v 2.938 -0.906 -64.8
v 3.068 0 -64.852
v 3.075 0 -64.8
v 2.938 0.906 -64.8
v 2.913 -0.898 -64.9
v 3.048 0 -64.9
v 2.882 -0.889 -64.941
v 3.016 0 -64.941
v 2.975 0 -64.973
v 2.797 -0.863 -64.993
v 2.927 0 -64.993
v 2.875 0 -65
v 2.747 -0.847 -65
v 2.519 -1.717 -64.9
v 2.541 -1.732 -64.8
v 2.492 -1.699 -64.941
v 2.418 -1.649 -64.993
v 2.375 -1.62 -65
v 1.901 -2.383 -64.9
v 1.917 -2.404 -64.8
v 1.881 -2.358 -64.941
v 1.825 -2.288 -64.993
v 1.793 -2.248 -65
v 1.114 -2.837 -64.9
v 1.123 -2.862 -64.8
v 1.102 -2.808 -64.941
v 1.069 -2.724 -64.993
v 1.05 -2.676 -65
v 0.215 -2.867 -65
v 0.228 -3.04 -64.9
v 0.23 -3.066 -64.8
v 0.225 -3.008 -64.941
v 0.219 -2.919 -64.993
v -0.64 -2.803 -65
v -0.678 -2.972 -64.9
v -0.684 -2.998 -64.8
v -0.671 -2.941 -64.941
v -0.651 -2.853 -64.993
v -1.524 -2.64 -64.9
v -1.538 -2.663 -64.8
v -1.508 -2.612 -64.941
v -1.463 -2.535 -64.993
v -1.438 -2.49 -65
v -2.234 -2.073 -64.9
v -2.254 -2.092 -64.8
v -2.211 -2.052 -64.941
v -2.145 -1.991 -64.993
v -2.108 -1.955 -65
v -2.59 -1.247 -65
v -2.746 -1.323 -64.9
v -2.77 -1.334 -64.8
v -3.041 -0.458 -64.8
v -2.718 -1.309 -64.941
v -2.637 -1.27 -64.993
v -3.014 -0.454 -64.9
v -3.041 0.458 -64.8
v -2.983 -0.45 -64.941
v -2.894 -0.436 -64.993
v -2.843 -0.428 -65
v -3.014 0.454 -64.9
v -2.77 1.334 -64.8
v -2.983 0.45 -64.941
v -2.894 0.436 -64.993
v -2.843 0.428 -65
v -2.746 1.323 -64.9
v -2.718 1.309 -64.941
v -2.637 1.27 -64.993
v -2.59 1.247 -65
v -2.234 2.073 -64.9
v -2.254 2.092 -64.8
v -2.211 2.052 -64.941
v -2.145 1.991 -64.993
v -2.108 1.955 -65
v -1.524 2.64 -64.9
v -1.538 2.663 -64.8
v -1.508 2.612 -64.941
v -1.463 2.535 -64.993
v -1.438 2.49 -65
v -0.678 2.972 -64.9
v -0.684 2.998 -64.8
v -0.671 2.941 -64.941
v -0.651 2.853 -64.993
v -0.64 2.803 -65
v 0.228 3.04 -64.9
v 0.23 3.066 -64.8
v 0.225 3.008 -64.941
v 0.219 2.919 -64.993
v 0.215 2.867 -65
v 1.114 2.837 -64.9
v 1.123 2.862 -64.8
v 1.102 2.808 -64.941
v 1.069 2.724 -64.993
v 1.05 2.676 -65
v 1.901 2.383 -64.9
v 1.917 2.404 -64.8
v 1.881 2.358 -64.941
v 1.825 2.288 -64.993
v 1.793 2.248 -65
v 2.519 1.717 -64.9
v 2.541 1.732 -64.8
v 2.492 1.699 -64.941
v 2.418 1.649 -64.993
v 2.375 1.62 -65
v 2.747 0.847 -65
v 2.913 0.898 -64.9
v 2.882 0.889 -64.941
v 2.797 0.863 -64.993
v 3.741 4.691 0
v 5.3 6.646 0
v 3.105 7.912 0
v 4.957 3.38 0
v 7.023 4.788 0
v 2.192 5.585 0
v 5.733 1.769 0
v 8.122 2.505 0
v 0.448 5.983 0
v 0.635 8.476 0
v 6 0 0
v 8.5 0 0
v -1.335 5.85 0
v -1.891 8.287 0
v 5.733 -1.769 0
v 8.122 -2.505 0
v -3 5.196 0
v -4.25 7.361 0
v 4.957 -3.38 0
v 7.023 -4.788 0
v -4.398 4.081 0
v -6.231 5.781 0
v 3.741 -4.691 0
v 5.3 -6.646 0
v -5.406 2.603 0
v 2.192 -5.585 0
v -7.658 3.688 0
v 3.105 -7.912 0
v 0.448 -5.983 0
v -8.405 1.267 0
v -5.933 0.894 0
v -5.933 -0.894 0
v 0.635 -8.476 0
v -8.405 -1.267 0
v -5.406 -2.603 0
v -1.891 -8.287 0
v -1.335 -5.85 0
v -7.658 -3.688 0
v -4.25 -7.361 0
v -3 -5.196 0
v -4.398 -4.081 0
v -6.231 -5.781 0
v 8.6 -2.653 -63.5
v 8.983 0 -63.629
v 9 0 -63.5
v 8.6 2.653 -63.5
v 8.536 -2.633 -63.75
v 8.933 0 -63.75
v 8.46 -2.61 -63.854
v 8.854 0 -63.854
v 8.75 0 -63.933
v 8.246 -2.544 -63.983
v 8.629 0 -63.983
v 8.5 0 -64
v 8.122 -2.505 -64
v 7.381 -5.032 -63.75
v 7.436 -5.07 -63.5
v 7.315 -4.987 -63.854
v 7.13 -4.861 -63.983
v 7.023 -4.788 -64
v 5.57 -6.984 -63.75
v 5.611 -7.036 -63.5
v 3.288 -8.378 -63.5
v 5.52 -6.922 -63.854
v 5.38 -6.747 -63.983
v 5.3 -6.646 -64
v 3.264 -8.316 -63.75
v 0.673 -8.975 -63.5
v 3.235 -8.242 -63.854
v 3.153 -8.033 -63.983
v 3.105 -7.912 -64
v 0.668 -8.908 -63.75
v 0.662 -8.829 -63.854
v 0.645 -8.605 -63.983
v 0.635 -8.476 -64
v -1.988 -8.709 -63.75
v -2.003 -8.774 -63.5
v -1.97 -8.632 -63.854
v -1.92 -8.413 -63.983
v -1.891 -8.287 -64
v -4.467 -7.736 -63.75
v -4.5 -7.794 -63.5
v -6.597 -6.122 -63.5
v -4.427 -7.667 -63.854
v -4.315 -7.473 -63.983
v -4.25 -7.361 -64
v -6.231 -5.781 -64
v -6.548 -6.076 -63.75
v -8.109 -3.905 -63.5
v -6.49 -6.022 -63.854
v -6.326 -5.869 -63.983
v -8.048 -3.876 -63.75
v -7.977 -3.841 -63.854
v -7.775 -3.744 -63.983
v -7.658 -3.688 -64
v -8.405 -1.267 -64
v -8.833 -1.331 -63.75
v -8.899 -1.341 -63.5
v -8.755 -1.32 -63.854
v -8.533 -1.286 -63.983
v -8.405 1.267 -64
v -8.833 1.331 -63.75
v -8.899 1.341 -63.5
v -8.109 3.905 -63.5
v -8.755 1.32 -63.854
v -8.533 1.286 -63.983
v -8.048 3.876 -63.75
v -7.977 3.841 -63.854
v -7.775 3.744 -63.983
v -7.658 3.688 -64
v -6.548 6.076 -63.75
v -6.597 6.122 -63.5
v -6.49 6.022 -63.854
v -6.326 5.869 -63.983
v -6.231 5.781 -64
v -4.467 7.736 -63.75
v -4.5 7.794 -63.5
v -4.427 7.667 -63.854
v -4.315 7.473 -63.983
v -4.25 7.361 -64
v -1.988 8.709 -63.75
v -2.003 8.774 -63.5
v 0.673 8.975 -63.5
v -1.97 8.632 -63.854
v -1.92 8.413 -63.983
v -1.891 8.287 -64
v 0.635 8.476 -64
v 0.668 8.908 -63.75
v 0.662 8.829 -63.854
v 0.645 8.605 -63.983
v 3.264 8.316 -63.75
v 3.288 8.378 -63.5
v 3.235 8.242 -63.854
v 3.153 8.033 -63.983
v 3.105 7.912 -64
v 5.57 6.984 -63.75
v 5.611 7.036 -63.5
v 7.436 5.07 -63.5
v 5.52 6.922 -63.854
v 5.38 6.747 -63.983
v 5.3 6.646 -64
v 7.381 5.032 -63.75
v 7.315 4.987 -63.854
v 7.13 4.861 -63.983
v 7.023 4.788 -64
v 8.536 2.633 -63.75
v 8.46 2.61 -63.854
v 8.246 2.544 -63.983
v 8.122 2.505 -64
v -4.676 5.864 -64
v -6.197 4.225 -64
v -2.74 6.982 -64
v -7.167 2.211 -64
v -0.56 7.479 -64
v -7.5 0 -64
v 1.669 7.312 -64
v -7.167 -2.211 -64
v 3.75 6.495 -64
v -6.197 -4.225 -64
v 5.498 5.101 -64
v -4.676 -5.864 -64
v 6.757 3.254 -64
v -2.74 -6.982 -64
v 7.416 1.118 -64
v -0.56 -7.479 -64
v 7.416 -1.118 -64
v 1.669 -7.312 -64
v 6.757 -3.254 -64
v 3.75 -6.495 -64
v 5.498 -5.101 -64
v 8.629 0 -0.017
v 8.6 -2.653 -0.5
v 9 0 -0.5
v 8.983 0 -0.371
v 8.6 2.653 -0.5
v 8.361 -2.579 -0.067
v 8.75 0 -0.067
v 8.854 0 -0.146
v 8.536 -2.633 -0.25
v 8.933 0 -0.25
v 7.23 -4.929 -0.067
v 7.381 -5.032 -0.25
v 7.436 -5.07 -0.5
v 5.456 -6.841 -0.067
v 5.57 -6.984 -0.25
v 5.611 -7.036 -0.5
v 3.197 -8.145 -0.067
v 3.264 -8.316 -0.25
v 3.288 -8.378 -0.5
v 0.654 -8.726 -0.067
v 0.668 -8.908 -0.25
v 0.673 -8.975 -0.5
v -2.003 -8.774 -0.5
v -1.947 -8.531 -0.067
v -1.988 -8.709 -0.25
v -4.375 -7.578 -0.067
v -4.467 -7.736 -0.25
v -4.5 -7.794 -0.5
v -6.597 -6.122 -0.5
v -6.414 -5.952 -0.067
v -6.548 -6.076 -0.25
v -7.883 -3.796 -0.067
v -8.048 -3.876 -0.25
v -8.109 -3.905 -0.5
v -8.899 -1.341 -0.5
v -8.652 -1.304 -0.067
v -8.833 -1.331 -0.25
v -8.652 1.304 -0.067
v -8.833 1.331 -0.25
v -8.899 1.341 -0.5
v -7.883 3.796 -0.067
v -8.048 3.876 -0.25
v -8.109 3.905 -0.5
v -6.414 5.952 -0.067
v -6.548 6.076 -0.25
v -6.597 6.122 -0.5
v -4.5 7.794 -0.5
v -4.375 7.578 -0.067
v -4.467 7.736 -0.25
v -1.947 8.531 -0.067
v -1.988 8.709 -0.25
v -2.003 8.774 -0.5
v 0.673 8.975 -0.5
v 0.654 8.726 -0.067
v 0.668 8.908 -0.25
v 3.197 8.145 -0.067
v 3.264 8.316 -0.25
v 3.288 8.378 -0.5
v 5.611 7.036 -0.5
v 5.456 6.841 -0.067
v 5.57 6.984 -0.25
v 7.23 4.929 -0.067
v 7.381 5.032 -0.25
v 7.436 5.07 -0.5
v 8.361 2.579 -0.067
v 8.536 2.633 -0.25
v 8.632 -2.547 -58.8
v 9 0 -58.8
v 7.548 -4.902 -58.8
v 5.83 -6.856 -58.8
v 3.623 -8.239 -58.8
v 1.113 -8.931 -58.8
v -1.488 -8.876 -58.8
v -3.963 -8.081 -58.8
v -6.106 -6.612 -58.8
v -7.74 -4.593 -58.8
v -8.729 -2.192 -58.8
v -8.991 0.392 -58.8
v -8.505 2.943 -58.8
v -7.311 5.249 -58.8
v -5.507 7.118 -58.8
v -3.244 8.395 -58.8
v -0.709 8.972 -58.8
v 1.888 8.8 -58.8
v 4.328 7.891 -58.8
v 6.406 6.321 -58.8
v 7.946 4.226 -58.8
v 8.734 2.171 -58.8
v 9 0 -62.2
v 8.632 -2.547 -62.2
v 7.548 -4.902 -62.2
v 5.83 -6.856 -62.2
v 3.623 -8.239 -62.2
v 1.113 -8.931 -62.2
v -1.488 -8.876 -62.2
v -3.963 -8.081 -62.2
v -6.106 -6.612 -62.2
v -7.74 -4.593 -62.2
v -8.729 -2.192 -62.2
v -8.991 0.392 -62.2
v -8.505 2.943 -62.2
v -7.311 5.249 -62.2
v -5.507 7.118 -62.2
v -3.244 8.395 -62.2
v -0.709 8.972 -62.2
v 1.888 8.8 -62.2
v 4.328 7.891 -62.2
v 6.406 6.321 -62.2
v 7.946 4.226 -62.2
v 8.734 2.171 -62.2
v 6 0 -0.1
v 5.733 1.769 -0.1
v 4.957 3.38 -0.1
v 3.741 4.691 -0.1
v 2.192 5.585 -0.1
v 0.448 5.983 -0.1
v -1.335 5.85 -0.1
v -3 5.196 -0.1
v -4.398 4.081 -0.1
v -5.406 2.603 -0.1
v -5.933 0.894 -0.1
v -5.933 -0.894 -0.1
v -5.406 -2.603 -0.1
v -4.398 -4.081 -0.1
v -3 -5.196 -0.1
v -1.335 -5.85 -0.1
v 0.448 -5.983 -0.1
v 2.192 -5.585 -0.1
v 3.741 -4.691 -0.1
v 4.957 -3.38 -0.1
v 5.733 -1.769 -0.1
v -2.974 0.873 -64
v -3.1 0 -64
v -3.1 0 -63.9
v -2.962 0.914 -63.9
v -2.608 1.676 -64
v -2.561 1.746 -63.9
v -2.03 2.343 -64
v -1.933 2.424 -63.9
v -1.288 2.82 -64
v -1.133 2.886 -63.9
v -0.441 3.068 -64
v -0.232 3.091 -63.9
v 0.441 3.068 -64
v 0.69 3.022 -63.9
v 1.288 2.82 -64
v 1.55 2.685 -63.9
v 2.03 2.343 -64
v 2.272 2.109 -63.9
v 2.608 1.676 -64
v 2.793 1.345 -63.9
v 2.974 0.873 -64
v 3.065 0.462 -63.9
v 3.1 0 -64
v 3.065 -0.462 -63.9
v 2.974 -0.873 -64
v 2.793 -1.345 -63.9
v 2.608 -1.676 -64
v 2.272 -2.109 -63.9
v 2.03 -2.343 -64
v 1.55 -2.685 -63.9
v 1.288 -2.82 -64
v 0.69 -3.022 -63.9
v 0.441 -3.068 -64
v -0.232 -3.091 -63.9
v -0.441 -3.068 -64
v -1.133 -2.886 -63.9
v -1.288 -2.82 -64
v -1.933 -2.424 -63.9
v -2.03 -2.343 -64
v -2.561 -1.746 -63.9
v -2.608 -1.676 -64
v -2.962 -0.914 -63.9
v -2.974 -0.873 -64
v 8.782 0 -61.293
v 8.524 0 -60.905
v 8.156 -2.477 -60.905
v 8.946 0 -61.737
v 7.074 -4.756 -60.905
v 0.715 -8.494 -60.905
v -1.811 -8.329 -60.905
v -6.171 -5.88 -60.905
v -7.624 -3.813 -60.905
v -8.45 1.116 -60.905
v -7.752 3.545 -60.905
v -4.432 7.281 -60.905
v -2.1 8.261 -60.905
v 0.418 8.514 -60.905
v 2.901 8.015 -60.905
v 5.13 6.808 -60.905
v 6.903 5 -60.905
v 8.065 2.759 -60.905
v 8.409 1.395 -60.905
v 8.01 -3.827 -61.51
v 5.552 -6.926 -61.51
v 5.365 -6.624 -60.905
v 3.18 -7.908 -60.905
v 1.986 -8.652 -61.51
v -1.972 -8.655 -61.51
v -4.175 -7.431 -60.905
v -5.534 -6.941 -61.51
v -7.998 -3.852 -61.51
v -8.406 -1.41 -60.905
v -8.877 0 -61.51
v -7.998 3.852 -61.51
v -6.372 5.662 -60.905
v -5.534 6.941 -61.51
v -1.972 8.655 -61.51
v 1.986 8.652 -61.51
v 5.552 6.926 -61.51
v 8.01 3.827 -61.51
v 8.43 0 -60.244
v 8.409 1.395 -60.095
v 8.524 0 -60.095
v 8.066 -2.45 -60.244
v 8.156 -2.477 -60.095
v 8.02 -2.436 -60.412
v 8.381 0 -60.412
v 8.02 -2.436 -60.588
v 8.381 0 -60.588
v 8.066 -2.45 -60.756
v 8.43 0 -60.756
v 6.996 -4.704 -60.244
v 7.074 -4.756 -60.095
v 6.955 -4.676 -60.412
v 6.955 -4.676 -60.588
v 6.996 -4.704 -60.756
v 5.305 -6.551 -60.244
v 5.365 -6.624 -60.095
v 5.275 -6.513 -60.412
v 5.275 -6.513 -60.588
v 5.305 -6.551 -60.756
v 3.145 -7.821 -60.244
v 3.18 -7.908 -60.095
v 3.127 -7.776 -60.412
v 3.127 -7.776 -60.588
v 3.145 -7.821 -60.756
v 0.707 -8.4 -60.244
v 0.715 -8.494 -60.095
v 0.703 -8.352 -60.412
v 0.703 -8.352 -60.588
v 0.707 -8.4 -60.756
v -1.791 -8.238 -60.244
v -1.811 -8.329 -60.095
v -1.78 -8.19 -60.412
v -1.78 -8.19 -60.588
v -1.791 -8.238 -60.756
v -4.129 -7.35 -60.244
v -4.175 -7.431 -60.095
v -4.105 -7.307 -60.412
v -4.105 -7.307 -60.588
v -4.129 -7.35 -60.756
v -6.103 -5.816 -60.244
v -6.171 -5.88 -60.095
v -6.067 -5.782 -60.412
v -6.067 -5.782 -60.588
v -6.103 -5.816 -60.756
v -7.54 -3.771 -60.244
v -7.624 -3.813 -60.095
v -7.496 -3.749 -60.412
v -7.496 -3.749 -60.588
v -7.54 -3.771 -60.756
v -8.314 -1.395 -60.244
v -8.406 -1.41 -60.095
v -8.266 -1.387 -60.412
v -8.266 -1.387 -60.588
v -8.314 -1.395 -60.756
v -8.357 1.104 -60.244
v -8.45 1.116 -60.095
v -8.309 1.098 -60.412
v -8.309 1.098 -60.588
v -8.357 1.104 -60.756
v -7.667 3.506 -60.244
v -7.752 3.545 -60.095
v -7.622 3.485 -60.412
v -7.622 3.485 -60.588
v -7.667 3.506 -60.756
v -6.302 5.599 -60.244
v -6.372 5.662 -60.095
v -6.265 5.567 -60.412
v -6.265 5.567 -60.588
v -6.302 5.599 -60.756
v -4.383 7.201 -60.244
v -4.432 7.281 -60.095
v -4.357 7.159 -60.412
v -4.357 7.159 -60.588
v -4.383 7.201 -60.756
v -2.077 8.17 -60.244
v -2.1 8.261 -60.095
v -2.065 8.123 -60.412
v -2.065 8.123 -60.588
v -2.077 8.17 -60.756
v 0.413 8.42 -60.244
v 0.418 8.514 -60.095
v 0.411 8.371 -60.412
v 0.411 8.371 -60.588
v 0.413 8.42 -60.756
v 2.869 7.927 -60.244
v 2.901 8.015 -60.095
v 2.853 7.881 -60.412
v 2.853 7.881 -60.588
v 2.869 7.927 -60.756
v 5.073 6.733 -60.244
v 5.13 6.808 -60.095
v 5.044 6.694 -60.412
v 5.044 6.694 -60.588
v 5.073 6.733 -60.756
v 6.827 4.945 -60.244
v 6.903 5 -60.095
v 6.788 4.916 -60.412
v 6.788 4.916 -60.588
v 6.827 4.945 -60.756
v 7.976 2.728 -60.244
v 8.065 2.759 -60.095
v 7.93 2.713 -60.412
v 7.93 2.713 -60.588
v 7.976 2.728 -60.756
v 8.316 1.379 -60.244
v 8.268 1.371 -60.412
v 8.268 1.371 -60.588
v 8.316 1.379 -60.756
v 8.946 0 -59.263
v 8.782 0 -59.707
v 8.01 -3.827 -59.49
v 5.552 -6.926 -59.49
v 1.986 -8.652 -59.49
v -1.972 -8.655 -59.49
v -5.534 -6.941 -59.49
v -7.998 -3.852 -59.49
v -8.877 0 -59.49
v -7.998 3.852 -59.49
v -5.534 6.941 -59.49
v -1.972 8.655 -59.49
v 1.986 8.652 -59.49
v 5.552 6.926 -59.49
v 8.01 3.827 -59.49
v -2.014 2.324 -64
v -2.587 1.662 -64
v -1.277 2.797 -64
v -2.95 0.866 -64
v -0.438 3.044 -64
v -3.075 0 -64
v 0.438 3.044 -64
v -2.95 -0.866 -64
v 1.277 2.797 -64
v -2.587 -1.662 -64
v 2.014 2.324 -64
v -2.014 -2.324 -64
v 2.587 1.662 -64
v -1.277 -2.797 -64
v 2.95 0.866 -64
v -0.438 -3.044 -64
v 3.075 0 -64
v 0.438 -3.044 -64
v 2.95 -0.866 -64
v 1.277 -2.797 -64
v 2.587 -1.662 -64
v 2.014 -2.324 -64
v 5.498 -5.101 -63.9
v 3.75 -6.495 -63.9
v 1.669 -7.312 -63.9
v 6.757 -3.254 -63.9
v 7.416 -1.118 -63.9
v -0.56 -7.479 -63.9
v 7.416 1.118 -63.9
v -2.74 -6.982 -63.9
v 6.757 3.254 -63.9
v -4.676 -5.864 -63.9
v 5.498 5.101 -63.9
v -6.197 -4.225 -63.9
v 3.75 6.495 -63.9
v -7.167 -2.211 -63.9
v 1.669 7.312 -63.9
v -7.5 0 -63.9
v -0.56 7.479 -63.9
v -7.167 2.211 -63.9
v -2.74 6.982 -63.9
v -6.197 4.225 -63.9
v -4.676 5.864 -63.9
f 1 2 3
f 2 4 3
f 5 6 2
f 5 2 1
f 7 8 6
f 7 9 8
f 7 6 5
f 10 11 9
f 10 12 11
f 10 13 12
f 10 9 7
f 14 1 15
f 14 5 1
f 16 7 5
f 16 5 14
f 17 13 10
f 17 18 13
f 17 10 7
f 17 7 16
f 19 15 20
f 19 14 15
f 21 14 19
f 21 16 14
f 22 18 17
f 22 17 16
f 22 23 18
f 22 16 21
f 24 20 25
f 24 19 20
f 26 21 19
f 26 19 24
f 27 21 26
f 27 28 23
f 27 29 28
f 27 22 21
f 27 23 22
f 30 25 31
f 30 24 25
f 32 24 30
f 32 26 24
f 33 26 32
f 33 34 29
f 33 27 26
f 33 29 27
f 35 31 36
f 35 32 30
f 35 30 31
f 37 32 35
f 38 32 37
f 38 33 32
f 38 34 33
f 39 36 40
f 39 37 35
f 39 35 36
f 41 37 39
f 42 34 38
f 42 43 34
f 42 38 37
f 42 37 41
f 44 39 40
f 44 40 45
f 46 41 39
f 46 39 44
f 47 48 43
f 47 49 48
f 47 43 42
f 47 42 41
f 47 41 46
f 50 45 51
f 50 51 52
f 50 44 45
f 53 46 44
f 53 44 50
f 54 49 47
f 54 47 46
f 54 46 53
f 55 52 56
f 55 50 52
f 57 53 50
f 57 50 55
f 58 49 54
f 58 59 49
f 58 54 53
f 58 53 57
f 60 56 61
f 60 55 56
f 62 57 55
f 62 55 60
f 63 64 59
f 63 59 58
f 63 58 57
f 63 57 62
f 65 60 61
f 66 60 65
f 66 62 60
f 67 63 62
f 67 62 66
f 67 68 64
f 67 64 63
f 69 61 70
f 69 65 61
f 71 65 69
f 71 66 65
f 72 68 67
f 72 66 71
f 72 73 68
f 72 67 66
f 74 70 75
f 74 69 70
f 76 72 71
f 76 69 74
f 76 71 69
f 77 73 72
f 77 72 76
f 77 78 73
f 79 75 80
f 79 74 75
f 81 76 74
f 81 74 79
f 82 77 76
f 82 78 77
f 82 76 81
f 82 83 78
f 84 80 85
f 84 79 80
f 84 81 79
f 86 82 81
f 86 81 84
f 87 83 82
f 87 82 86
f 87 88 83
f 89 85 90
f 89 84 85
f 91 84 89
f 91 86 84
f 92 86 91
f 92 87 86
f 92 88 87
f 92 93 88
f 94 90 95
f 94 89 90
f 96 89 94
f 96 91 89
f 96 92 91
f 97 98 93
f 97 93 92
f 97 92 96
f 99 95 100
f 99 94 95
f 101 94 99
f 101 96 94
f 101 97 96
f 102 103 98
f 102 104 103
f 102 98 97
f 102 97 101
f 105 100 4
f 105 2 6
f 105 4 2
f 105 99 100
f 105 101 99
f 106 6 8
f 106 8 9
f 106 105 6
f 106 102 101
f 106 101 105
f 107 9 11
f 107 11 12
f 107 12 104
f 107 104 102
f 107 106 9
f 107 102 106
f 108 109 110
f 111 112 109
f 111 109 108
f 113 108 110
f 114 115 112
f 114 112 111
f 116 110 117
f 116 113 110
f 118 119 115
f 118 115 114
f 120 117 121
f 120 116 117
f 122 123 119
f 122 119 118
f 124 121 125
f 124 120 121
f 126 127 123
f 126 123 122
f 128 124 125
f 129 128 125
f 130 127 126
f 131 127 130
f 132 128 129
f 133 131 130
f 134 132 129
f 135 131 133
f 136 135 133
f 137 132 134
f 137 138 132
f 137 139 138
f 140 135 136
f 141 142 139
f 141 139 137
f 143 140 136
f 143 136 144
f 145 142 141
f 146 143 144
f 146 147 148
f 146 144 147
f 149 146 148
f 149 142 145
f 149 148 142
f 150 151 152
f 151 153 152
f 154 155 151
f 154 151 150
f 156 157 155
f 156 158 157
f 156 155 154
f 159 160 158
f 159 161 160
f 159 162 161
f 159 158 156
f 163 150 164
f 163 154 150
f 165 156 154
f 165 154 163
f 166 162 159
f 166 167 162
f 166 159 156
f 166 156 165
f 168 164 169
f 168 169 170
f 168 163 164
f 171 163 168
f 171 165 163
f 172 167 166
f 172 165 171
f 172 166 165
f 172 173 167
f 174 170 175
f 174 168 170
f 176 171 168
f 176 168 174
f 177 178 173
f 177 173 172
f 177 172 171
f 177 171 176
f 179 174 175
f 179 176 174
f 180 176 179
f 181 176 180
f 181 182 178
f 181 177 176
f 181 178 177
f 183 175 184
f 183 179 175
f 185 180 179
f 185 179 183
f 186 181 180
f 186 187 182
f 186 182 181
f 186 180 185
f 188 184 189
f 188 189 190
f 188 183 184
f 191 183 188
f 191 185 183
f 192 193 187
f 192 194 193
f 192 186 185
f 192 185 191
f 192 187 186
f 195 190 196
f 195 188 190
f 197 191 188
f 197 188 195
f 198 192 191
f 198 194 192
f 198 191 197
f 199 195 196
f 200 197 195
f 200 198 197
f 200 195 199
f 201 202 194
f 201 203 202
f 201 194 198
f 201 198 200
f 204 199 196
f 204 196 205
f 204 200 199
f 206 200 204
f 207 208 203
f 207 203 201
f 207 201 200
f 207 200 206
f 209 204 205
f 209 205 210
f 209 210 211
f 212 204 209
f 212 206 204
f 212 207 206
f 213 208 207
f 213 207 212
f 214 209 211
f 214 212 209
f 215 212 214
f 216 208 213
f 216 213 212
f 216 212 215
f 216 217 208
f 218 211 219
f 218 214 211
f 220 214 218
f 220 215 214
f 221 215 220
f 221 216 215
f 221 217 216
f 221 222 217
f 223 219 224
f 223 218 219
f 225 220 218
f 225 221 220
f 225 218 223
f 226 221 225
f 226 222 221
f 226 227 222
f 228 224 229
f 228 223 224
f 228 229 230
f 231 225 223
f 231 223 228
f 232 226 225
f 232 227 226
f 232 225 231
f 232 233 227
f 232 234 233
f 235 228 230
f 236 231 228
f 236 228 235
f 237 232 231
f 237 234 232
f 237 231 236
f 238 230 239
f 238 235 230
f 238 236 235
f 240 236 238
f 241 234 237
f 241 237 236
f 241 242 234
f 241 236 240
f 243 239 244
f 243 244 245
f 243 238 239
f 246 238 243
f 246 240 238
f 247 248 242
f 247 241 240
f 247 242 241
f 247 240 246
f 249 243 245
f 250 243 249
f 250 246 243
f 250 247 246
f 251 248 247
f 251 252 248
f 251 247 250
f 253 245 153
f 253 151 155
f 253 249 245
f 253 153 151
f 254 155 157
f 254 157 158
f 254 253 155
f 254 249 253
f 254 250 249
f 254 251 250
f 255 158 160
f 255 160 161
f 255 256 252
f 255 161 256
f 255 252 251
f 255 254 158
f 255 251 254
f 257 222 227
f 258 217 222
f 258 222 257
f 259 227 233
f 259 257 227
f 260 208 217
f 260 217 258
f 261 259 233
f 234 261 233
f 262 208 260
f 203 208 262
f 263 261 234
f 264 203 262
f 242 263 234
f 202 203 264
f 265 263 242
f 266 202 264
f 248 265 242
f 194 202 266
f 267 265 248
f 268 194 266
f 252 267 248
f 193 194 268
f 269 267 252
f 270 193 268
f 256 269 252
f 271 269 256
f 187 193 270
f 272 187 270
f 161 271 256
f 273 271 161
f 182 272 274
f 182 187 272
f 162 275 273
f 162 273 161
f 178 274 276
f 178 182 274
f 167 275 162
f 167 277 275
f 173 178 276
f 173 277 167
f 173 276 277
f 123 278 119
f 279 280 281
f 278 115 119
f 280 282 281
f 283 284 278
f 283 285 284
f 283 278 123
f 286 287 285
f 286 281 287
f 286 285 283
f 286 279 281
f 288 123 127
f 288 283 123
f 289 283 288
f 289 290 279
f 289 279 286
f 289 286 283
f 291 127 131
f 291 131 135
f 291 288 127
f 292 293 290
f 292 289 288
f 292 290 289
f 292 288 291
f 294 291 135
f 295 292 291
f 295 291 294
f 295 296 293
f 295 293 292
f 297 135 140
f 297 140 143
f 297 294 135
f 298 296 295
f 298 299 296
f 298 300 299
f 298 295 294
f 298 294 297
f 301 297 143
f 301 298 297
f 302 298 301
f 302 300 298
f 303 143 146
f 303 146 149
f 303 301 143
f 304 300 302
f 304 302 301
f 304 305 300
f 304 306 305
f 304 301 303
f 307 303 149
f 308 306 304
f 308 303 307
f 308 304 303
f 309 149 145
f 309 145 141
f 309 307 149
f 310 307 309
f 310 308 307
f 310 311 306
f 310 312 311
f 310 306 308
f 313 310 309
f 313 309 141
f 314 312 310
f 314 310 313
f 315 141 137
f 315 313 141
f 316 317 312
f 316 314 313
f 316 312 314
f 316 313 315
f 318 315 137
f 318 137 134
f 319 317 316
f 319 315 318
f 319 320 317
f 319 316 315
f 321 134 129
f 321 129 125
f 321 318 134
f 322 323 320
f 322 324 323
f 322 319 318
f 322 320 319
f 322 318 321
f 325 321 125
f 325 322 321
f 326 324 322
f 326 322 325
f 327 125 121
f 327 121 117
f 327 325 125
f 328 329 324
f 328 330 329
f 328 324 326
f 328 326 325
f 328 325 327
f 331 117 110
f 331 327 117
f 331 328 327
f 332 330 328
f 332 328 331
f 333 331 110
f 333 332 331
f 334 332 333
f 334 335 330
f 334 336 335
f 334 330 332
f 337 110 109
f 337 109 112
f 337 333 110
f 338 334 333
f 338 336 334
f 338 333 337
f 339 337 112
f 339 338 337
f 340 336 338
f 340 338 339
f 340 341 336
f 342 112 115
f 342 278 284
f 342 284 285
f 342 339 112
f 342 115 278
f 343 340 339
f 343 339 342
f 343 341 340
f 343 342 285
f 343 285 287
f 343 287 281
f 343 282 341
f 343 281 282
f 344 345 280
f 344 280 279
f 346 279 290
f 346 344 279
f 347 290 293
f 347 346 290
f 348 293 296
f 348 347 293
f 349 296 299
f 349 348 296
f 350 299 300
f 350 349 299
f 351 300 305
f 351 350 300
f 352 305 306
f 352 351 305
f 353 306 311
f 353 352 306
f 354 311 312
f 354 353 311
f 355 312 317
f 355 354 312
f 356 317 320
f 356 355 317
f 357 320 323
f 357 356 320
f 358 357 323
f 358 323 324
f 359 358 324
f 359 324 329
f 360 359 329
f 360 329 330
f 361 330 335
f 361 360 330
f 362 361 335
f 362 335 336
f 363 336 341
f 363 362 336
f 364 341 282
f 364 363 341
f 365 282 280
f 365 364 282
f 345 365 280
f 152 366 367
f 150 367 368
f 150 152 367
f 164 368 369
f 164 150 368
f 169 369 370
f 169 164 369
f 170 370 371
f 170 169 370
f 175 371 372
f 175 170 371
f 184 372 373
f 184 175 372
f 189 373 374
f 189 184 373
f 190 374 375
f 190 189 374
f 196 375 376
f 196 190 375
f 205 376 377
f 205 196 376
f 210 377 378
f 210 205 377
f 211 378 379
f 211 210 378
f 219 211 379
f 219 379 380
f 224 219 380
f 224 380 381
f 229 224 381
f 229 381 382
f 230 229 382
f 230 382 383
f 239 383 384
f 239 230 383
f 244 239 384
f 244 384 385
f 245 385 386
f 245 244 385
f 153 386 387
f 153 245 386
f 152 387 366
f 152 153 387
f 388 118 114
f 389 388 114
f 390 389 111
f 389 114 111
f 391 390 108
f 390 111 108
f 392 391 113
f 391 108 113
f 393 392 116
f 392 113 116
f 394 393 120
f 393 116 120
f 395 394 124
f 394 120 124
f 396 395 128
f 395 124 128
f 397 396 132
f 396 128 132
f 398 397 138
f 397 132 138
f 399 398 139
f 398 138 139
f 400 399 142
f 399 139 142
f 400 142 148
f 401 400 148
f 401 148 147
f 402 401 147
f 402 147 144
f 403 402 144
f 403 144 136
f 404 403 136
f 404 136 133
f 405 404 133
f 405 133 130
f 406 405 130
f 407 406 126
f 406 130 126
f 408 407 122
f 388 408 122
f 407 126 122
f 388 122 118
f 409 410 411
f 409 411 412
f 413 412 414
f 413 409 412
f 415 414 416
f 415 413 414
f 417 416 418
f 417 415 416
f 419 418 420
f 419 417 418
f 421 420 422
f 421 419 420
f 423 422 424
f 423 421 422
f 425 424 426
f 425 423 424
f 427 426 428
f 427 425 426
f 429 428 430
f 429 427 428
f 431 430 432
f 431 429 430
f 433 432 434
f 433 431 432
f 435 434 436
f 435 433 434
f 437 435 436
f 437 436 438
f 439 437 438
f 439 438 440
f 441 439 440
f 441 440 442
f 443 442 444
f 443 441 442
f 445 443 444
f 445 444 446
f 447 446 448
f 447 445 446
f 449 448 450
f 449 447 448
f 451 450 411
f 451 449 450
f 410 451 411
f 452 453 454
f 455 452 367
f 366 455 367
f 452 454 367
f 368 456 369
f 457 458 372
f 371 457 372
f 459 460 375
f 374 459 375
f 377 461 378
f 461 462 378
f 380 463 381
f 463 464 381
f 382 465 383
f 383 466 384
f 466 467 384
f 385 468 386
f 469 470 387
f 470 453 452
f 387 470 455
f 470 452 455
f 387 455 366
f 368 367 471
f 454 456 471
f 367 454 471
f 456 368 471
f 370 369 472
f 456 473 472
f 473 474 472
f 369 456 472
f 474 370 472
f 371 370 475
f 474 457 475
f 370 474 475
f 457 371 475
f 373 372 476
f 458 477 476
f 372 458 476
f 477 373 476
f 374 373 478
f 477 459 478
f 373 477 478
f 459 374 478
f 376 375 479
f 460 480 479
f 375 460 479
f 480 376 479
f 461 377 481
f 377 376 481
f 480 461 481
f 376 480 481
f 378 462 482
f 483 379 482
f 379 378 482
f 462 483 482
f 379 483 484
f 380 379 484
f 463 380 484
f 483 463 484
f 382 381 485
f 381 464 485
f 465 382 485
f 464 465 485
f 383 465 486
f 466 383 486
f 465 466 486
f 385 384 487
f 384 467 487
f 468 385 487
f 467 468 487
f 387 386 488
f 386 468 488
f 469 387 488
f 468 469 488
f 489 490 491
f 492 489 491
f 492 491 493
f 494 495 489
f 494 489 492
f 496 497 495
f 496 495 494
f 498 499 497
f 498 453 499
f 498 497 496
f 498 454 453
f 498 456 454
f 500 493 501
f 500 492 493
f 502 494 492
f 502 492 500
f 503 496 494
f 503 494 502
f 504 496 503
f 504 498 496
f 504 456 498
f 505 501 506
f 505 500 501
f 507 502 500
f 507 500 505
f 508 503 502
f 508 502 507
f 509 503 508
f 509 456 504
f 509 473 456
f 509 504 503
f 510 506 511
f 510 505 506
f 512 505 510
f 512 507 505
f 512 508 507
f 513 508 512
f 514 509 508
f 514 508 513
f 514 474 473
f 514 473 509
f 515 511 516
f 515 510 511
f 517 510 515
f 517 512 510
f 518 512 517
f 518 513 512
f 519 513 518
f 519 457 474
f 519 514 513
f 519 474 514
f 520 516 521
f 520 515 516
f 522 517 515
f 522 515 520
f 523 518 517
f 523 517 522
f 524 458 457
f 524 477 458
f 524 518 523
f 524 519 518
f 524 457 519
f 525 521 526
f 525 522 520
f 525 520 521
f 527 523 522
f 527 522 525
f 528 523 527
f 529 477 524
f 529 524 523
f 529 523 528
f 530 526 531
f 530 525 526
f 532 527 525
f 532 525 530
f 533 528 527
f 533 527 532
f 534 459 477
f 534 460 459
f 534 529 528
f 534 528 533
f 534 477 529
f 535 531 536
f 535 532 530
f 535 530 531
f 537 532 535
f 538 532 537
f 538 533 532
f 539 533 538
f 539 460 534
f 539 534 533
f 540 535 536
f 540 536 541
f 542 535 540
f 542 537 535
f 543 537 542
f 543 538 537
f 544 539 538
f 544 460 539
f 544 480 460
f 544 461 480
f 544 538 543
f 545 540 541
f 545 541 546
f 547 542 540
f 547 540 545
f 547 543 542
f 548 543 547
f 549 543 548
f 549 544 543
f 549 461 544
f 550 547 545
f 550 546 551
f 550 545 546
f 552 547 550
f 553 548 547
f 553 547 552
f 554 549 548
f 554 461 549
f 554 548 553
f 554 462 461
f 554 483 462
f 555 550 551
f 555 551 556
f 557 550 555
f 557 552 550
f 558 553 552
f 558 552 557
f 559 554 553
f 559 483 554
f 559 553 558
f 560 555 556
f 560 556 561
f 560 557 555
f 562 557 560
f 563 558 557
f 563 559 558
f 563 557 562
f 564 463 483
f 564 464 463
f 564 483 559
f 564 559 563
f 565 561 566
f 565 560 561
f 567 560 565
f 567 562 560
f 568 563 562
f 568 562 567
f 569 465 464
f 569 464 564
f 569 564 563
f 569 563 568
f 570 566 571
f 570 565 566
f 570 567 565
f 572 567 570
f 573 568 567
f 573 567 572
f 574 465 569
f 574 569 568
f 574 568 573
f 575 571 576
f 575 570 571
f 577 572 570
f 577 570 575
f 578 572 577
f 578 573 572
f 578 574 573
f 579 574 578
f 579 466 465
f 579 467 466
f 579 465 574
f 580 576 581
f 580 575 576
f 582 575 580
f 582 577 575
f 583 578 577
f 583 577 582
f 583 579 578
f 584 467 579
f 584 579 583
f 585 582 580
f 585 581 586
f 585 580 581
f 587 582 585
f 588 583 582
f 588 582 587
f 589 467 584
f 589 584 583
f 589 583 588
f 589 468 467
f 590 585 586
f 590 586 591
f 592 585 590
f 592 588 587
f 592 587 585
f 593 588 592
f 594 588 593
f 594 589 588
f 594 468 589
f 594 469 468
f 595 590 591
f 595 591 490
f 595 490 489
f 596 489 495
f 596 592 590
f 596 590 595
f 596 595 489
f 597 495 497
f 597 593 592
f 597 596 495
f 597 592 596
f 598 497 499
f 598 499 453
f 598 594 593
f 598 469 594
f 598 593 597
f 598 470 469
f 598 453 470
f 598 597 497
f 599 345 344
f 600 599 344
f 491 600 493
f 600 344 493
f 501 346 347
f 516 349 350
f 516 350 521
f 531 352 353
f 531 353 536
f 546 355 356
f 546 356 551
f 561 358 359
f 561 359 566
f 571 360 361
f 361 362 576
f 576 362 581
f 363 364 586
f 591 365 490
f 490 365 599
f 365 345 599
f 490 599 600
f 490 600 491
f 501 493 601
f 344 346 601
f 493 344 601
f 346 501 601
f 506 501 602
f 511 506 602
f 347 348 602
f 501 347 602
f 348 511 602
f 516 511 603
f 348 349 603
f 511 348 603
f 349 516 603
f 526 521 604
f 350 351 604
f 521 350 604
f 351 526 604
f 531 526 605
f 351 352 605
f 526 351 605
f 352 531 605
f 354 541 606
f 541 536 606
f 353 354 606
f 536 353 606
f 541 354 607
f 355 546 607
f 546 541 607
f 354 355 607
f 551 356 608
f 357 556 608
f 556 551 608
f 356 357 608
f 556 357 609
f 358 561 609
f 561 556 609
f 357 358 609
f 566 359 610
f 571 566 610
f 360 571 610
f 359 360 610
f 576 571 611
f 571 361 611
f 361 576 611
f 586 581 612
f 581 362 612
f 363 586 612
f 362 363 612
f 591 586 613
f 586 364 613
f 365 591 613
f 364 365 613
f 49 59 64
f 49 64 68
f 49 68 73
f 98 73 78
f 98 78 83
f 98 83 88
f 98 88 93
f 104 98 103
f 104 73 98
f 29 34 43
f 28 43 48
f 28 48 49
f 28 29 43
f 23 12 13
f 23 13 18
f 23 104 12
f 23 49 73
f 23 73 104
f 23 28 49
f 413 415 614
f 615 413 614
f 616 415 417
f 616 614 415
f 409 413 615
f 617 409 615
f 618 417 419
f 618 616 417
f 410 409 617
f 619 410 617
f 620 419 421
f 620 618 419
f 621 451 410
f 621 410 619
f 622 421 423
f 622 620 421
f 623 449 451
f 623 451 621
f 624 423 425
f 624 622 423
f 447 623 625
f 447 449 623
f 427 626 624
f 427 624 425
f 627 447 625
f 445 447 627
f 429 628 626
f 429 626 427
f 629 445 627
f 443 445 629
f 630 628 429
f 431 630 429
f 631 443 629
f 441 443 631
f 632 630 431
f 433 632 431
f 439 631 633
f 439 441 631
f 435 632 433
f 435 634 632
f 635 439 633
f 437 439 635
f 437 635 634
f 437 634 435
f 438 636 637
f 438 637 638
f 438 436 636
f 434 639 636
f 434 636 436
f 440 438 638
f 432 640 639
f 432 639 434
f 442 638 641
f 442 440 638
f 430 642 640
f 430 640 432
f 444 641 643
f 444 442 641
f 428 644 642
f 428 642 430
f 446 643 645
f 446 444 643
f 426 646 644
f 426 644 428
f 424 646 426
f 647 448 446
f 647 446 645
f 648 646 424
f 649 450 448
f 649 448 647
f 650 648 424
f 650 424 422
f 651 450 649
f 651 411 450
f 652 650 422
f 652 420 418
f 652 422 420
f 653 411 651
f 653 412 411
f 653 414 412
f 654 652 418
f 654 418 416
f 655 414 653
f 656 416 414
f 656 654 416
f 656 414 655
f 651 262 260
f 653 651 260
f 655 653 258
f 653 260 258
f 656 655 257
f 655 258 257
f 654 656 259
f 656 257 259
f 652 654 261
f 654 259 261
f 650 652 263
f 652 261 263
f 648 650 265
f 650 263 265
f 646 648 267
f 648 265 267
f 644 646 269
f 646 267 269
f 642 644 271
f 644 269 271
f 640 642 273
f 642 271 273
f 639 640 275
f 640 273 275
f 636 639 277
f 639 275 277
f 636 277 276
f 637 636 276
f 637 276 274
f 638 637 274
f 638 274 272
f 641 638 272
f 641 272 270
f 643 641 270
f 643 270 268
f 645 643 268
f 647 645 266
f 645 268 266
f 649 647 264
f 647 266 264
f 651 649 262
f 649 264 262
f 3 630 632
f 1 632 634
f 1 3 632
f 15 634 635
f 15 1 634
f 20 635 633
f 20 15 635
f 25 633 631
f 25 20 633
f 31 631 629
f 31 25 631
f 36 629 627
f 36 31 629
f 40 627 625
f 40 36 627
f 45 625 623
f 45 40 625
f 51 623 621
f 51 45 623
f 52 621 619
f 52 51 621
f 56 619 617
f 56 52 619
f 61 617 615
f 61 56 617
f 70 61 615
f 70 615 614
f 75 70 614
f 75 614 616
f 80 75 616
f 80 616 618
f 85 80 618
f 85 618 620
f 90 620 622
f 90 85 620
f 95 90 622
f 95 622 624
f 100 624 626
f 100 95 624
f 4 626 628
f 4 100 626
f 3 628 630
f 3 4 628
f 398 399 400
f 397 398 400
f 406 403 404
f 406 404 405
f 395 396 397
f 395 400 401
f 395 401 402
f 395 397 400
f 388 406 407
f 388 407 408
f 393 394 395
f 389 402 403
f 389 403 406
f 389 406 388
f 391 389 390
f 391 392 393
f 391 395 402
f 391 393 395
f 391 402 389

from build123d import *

# Parameters (mm, degrees)
FILLET1_R          = 0.5
FILLET2_R          = 2
FILLET3_R          = 0.2
SKETCH3_R          = 6
CUT_EXTRUDE1_DEPTH = 0.1
SKETCH4_R          = 7.5
SKETCH4_R_2        = 3.1
CUT_EXTRUDE2_DEPTH = 0.1


with BuildPart() as part:
    # Sketch2 → Revolve1 (revolve)
    with BuildSketch(Plane(origin=(0, 0, 0), x_dir=(0, 0, -1), z_dir=(1, 0, 0)), mode=Mode.PRIVATE) as revolve1_sk:
        with BuildLine():
            Line((0, 0), (0, 9))
            Line((0, 9), (59.875, 9))
            ThreePointArc((59.875, 9), (60.5, 8.375), (61.125, 9))
            Line((61.125, 9), (64, 9))
            Line((64, 9), (64, 3.075))
            Line((64, 3.075), (65, 3.075))
            Line((65, 3.075), (65, 0))
            Line((65, 0), (0, 0))
        make_face()
    revolve(revolve1_sk.sketch.rotate(Axis((0, 0, 1000), (0, 0, -1)), 90), axis=Axis((0, 0, 1000), (0, 0, -1)))

    # Fillet1
    fillet1_edges = [part.edges().sort_by_distance(p)[0] for p in [
        (-9, 0, 0),
        (-9, 0, -64),
    ]]
    fillet(fillet1_edges, radius=FILLET1_R)

    # Fillet2
    fillet2_edges = [part.edges().sort_by_distance(p)[0] for p in [
        (-9, 0, -59.875),
        (-9, 0, -61.125),
    ]]
    fillet(fillet2_edges, radius=FILLET2_R)

    # Fillet3
    fillet3_edges = [part.edges().sort_by_distance(p)[0] for p in [
        (-3.075, 0, -65),
    ]]
    fillet(fillet3_edges, radius=FILLET3_R)

    # Sketch3 → Cut-Extrude1 (cut)
    with BuildSketch(Plane.XY):
        Circle(SKETCH3_R)
    extrude(amount=-CUT_EXTRUDE1_DEPTH, mode=Mode.SUBTRACT)

    # Sketch4 → Cut-Extrude2 (cut)
    with BuildSketch(Plane(origin=(0, 0, -64), x_dir=(-1, 0, 0), z_dir=(0, 0, -1))):
        Circle(SKETCH4_R)
        Circle(SKETCH4_R_2, mode=Mode.SUBTRACT)
    extrude(amount=-CUT_EXTRUDE2_DEPTH, mode=Mode.SUBTRACT)


solid = part.part
